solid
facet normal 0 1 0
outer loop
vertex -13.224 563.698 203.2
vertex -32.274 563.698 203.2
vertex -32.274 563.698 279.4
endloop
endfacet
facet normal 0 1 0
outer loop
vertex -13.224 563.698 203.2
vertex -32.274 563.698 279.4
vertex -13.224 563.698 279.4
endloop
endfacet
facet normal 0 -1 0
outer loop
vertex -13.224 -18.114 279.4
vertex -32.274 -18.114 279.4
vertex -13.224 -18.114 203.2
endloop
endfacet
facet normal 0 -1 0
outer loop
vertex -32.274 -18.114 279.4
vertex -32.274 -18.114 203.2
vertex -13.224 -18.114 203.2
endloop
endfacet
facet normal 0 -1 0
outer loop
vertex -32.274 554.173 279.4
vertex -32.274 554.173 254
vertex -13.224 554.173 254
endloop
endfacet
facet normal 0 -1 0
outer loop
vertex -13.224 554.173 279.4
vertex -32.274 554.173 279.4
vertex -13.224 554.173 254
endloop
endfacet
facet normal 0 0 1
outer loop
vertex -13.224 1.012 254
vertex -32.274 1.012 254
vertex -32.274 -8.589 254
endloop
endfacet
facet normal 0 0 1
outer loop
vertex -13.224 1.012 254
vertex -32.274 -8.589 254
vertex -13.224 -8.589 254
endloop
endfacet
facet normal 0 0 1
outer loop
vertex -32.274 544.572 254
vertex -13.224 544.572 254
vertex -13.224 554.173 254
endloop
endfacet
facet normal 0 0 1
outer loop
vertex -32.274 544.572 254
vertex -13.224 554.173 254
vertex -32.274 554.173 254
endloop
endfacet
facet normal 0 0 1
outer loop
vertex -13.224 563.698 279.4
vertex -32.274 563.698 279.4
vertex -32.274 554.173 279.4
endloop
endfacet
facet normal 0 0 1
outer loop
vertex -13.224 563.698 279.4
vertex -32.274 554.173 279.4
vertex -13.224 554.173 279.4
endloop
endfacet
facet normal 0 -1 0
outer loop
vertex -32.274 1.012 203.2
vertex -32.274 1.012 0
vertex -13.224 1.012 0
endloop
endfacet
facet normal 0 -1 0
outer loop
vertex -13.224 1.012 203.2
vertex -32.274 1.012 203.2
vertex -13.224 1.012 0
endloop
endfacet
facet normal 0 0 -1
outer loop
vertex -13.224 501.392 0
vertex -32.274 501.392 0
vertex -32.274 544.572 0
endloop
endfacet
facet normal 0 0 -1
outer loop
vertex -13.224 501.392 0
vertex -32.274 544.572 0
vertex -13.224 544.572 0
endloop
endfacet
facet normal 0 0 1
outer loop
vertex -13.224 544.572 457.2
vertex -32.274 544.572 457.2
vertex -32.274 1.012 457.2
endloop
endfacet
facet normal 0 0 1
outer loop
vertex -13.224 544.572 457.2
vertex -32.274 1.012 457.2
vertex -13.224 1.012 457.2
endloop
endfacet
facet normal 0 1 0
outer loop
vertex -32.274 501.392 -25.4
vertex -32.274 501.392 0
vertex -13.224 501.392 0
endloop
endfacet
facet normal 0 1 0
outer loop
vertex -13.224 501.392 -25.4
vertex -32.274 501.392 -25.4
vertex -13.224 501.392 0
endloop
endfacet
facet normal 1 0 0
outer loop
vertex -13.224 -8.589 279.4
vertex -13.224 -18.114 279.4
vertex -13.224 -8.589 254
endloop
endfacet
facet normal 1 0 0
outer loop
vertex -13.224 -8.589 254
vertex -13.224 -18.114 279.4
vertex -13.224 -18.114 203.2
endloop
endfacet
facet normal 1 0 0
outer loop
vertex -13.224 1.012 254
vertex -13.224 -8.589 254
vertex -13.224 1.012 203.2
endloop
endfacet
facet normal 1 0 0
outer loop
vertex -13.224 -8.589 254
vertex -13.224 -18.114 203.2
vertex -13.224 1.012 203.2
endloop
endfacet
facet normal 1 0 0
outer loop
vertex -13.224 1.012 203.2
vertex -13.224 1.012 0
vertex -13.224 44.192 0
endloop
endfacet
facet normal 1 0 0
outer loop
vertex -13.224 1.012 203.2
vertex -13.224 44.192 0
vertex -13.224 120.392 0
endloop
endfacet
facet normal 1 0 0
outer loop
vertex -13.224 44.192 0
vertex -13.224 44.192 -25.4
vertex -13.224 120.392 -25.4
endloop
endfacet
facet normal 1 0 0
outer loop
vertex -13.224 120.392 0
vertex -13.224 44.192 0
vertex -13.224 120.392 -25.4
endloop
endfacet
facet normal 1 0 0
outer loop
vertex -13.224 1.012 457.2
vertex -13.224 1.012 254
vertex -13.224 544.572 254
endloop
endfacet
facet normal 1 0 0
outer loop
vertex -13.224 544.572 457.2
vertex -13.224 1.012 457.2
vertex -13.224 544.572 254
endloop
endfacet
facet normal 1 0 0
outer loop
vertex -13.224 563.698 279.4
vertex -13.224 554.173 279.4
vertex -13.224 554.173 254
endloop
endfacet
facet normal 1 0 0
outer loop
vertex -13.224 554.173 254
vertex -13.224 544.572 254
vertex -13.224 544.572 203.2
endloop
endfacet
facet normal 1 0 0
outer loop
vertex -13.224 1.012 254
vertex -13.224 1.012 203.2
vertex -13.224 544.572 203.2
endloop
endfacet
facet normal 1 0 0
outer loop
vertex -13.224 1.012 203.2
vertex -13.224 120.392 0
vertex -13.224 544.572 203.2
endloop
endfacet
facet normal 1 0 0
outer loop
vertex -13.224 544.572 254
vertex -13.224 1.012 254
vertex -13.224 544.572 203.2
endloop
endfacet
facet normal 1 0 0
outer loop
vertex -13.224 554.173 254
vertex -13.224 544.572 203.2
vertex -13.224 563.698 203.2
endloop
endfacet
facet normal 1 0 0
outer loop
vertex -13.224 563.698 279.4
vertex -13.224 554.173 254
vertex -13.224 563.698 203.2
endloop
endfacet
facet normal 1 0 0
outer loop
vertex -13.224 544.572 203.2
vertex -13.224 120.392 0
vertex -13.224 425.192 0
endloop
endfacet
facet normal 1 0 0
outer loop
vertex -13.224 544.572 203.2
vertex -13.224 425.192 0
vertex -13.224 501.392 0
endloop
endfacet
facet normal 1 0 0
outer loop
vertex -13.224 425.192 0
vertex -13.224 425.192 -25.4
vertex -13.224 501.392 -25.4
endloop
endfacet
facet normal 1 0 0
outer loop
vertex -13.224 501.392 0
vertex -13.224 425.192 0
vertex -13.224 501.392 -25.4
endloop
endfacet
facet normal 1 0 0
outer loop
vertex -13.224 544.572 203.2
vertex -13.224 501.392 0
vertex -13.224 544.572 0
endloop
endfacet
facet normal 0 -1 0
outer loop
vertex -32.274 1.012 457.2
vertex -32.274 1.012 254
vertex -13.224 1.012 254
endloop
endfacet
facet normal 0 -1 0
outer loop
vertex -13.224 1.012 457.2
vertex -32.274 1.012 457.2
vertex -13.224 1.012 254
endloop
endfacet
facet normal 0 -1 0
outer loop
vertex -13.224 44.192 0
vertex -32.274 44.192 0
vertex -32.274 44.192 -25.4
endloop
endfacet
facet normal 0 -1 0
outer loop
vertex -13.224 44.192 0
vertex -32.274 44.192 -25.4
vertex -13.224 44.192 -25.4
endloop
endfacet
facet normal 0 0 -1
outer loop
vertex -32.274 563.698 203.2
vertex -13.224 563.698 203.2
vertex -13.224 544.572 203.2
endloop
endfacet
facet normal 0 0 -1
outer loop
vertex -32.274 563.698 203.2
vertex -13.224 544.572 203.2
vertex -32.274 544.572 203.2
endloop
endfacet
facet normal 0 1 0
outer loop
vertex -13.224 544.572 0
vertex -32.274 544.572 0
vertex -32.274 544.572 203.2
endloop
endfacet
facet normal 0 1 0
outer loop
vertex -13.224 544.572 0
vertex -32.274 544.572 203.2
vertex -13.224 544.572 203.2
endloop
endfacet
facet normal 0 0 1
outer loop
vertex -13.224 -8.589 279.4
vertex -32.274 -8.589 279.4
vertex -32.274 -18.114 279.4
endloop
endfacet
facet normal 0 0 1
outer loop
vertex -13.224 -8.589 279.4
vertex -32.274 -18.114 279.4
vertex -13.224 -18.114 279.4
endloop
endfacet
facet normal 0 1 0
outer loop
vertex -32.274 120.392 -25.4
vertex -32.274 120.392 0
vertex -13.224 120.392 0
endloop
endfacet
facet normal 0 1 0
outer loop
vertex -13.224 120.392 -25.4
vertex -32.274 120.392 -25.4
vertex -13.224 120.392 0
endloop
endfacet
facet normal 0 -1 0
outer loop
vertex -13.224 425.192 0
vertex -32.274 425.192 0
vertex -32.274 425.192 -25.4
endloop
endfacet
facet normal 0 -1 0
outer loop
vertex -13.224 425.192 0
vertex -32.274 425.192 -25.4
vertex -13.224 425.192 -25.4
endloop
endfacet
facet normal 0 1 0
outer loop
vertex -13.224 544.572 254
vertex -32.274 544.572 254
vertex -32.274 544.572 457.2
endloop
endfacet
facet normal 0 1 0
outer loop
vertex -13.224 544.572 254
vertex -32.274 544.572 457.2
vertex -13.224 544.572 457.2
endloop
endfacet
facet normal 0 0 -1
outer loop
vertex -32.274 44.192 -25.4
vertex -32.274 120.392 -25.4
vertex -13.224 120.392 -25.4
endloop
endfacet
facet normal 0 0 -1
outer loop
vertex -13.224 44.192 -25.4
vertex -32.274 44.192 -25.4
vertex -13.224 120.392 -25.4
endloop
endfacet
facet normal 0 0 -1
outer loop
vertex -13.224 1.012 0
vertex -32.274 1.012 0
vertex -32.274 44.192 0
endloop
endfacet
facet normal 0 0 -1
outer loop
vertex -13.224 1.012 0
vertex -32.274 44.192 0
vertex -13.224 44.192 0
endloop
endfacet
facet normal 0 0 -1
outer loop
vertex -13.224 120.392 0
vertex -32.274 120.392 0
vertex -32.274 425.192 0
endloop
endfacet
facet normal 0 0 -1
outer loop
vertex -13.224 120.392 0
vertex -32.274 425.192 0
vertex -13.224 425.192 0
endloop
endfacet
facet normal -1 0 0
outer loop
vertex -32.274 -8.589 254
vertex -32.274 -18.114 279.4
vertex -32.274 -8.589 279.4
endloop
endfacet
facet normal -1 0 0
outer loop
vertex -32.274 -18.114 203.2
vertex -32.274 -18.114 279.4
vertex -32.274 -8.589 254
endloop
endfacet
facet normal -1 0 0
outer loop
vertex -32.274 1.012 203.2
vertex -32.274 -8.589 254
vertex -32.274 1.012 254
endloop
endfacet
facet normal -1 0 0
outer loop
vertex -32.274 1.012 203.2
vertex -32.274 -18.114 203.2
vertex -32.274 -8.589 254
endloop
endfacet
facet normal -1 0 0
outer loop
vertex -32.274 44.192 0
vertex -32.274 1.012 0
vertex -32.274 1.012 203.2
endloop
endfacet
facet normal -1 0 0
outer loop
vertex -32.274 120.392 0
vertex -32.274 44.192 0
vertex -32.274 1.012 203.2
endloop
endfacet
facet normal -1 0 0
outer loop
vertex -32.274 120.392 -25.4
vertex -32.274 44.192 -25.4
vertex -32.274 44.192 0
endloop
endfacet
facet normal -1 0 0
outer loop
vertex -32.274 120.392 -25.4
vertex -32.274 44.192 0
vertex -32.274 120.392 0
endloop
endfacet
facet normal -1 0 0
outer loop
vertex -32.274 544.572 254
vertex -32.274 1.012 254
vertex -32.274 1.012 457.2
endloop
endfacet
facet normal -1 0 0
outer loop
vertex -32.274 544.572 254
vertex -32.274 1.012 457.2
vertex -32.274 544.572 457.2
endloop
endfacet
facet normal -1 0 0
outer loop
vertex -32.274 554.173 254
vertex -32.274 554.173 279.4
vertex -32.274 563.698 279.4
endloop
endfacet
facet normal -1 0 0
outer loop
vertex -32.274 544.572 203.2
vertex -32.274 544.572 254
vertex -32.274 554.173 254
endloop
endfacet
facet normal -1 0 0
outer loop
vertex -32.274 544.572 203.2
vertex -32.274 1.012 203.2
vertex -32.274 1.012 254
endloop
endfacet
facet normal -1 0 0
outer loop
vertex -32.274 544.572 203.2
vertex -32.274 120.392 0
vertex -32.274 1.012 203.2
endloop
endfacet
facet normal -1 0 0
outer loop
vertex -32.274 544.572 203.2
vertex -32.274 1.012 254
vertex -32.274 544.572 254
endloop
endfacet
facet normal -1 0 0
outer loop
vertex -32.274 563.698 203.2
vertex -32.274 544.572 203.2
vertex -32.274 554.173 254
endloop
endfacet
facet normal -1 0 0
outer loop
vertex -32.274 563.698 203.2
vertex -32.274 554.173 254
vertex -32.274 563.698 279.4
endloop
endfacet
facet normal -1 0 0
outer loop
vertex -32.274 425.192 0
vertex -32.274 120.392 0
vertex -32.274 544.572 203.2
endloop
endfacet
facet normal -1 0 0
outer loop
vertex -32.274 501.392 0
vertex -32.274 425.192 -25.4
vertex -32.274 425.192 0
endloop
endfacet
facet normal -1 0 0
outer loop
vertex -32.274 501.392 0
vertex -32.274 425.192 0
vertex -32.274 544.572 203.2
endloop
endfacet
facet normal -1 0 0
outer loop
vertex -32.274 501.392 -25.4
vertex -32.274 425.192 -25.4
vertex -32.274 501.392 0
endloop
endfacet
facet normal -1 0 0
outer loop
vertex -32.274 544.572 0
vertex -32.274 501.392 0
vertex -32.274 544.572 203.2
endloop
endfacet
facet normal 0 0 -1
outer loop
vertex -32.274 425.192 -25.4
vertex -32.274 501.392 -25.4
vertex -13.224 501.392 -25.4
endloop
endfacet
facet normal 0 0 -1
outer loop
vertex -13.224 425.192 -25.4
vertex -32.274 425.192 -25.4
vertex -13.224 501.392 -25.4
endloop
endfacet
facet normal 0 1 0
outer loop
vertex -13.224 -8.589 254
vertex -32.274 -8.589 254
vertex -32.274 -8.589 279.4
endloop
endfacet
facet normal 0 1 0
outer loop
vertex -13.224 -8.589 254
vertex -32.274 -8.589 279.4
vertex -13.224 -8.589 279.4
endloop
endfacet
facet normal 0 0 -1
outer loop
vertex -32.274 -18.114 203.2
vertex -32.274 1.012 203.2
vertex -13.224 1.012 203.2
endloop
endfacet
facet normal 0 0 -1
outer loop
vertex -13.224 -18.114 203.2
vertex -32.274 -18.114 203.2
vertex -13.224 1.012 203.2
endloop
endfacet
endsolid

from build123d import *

# Parameters (mm, degrees)
F0_W      = 19.05
F0_H      = 543.56
F1_DEPTH  = 457.2
F2_W      = 19.05
F2_H      = 50.8
F3_DEPTH  = 19.1262
F4_W      = 19.05
F4_H      = 9.525
F5_DEPTH  = 25.4
F6_W      = 19.05
F6_H      = 50.8
F7_DEPTH  = 19.1262
F8_W      = 19.05
F8_H      = 9.525
F9_DEPTH  = 25.4
F10_W     = 19.05
F10_H     = 76.2
F11_DEPTH = 9.652
F12_DEPTH = 25.4


# Not quite as in the source:
# - a feature names something its author has since deleted; it is built from what else it names


with BuildPart() as f1:
    # F0 (on Top) → F1 (new body)
    with BuildSketch(Plane.XY):
        with Locations((-22.7488256648, 272.7919273724)):
            Rectangle(F0_W, F0_H)
    extrude(amount=F1_DEPTH)

    # F2 (on face) → F3 (join)
    with BuildSketch(Plane(origin=(0, 544.5719273724, 0), x_dir=(-1, 0, 0), z_dir=(0, 1, 0))):
        with Locations((22.7488256648, 228.6)):
            Rectangle(F2_W, F2_H)
    extrude(amount=F3_DEPTH)

    # F4 (on face) → F5 (join)
    with BuildSketch(Plane.XY.offset(254)):
        with Locations((-22.7488256648, 558.9356273724)):
            Rectangle(F4_W, F4_H)
    extrude(amount=F5_DEPTH)

    # F6 (on face) → F7 (join)
    with BuildSketch(Plane.XZ.offset(-1.0119273724)):
        with Locations((-22.7488256648, 228.6)):
            Rectangle(F6_W, F6_H)
    extrude(amount=F7_DEPTH)

    # F8 (on face) → F9 (join)
    with BuildSketch(Plane.XY.offset(254)):
        with Locations((-22.7488256648, -13.3517726276)):
            Rectangle(F8_W, F8_H)
    extrude(amount=F9_DEPTH)

    # F10 (on face) → F11 (join)
    with BuildSketch(Plane(origin=(0, 0, 0), x_dir=(1, 0, 0), z_dir=(0, 0, -1))):
        with Locations((-22.7488256648, -82.2919273724)):
            Rectangle(F10_W, F10_H)
        with Locations((-22.7488256648, -463.2919273724)):
            Rectangle(F10_W, F10_H)
    extrude(amount=F11_DEPTH)

    # F10 (on face) → F12 (join)
    with BuildSketch(Plane(origin=(0, 0, 0), x_dir=(1, 0, 0), z_dir=(0, 0, -1))):
        with Locations((-22.7488256648, -82.2919273724)):
            Rectangle(F10_W, F10_H)
        with Locations((-22.7488256648, -463.2919273724)):
            Rectangle(F10_W, F10_H)
    extrude(amount=F12_DEPTH)


solid = f1.part
